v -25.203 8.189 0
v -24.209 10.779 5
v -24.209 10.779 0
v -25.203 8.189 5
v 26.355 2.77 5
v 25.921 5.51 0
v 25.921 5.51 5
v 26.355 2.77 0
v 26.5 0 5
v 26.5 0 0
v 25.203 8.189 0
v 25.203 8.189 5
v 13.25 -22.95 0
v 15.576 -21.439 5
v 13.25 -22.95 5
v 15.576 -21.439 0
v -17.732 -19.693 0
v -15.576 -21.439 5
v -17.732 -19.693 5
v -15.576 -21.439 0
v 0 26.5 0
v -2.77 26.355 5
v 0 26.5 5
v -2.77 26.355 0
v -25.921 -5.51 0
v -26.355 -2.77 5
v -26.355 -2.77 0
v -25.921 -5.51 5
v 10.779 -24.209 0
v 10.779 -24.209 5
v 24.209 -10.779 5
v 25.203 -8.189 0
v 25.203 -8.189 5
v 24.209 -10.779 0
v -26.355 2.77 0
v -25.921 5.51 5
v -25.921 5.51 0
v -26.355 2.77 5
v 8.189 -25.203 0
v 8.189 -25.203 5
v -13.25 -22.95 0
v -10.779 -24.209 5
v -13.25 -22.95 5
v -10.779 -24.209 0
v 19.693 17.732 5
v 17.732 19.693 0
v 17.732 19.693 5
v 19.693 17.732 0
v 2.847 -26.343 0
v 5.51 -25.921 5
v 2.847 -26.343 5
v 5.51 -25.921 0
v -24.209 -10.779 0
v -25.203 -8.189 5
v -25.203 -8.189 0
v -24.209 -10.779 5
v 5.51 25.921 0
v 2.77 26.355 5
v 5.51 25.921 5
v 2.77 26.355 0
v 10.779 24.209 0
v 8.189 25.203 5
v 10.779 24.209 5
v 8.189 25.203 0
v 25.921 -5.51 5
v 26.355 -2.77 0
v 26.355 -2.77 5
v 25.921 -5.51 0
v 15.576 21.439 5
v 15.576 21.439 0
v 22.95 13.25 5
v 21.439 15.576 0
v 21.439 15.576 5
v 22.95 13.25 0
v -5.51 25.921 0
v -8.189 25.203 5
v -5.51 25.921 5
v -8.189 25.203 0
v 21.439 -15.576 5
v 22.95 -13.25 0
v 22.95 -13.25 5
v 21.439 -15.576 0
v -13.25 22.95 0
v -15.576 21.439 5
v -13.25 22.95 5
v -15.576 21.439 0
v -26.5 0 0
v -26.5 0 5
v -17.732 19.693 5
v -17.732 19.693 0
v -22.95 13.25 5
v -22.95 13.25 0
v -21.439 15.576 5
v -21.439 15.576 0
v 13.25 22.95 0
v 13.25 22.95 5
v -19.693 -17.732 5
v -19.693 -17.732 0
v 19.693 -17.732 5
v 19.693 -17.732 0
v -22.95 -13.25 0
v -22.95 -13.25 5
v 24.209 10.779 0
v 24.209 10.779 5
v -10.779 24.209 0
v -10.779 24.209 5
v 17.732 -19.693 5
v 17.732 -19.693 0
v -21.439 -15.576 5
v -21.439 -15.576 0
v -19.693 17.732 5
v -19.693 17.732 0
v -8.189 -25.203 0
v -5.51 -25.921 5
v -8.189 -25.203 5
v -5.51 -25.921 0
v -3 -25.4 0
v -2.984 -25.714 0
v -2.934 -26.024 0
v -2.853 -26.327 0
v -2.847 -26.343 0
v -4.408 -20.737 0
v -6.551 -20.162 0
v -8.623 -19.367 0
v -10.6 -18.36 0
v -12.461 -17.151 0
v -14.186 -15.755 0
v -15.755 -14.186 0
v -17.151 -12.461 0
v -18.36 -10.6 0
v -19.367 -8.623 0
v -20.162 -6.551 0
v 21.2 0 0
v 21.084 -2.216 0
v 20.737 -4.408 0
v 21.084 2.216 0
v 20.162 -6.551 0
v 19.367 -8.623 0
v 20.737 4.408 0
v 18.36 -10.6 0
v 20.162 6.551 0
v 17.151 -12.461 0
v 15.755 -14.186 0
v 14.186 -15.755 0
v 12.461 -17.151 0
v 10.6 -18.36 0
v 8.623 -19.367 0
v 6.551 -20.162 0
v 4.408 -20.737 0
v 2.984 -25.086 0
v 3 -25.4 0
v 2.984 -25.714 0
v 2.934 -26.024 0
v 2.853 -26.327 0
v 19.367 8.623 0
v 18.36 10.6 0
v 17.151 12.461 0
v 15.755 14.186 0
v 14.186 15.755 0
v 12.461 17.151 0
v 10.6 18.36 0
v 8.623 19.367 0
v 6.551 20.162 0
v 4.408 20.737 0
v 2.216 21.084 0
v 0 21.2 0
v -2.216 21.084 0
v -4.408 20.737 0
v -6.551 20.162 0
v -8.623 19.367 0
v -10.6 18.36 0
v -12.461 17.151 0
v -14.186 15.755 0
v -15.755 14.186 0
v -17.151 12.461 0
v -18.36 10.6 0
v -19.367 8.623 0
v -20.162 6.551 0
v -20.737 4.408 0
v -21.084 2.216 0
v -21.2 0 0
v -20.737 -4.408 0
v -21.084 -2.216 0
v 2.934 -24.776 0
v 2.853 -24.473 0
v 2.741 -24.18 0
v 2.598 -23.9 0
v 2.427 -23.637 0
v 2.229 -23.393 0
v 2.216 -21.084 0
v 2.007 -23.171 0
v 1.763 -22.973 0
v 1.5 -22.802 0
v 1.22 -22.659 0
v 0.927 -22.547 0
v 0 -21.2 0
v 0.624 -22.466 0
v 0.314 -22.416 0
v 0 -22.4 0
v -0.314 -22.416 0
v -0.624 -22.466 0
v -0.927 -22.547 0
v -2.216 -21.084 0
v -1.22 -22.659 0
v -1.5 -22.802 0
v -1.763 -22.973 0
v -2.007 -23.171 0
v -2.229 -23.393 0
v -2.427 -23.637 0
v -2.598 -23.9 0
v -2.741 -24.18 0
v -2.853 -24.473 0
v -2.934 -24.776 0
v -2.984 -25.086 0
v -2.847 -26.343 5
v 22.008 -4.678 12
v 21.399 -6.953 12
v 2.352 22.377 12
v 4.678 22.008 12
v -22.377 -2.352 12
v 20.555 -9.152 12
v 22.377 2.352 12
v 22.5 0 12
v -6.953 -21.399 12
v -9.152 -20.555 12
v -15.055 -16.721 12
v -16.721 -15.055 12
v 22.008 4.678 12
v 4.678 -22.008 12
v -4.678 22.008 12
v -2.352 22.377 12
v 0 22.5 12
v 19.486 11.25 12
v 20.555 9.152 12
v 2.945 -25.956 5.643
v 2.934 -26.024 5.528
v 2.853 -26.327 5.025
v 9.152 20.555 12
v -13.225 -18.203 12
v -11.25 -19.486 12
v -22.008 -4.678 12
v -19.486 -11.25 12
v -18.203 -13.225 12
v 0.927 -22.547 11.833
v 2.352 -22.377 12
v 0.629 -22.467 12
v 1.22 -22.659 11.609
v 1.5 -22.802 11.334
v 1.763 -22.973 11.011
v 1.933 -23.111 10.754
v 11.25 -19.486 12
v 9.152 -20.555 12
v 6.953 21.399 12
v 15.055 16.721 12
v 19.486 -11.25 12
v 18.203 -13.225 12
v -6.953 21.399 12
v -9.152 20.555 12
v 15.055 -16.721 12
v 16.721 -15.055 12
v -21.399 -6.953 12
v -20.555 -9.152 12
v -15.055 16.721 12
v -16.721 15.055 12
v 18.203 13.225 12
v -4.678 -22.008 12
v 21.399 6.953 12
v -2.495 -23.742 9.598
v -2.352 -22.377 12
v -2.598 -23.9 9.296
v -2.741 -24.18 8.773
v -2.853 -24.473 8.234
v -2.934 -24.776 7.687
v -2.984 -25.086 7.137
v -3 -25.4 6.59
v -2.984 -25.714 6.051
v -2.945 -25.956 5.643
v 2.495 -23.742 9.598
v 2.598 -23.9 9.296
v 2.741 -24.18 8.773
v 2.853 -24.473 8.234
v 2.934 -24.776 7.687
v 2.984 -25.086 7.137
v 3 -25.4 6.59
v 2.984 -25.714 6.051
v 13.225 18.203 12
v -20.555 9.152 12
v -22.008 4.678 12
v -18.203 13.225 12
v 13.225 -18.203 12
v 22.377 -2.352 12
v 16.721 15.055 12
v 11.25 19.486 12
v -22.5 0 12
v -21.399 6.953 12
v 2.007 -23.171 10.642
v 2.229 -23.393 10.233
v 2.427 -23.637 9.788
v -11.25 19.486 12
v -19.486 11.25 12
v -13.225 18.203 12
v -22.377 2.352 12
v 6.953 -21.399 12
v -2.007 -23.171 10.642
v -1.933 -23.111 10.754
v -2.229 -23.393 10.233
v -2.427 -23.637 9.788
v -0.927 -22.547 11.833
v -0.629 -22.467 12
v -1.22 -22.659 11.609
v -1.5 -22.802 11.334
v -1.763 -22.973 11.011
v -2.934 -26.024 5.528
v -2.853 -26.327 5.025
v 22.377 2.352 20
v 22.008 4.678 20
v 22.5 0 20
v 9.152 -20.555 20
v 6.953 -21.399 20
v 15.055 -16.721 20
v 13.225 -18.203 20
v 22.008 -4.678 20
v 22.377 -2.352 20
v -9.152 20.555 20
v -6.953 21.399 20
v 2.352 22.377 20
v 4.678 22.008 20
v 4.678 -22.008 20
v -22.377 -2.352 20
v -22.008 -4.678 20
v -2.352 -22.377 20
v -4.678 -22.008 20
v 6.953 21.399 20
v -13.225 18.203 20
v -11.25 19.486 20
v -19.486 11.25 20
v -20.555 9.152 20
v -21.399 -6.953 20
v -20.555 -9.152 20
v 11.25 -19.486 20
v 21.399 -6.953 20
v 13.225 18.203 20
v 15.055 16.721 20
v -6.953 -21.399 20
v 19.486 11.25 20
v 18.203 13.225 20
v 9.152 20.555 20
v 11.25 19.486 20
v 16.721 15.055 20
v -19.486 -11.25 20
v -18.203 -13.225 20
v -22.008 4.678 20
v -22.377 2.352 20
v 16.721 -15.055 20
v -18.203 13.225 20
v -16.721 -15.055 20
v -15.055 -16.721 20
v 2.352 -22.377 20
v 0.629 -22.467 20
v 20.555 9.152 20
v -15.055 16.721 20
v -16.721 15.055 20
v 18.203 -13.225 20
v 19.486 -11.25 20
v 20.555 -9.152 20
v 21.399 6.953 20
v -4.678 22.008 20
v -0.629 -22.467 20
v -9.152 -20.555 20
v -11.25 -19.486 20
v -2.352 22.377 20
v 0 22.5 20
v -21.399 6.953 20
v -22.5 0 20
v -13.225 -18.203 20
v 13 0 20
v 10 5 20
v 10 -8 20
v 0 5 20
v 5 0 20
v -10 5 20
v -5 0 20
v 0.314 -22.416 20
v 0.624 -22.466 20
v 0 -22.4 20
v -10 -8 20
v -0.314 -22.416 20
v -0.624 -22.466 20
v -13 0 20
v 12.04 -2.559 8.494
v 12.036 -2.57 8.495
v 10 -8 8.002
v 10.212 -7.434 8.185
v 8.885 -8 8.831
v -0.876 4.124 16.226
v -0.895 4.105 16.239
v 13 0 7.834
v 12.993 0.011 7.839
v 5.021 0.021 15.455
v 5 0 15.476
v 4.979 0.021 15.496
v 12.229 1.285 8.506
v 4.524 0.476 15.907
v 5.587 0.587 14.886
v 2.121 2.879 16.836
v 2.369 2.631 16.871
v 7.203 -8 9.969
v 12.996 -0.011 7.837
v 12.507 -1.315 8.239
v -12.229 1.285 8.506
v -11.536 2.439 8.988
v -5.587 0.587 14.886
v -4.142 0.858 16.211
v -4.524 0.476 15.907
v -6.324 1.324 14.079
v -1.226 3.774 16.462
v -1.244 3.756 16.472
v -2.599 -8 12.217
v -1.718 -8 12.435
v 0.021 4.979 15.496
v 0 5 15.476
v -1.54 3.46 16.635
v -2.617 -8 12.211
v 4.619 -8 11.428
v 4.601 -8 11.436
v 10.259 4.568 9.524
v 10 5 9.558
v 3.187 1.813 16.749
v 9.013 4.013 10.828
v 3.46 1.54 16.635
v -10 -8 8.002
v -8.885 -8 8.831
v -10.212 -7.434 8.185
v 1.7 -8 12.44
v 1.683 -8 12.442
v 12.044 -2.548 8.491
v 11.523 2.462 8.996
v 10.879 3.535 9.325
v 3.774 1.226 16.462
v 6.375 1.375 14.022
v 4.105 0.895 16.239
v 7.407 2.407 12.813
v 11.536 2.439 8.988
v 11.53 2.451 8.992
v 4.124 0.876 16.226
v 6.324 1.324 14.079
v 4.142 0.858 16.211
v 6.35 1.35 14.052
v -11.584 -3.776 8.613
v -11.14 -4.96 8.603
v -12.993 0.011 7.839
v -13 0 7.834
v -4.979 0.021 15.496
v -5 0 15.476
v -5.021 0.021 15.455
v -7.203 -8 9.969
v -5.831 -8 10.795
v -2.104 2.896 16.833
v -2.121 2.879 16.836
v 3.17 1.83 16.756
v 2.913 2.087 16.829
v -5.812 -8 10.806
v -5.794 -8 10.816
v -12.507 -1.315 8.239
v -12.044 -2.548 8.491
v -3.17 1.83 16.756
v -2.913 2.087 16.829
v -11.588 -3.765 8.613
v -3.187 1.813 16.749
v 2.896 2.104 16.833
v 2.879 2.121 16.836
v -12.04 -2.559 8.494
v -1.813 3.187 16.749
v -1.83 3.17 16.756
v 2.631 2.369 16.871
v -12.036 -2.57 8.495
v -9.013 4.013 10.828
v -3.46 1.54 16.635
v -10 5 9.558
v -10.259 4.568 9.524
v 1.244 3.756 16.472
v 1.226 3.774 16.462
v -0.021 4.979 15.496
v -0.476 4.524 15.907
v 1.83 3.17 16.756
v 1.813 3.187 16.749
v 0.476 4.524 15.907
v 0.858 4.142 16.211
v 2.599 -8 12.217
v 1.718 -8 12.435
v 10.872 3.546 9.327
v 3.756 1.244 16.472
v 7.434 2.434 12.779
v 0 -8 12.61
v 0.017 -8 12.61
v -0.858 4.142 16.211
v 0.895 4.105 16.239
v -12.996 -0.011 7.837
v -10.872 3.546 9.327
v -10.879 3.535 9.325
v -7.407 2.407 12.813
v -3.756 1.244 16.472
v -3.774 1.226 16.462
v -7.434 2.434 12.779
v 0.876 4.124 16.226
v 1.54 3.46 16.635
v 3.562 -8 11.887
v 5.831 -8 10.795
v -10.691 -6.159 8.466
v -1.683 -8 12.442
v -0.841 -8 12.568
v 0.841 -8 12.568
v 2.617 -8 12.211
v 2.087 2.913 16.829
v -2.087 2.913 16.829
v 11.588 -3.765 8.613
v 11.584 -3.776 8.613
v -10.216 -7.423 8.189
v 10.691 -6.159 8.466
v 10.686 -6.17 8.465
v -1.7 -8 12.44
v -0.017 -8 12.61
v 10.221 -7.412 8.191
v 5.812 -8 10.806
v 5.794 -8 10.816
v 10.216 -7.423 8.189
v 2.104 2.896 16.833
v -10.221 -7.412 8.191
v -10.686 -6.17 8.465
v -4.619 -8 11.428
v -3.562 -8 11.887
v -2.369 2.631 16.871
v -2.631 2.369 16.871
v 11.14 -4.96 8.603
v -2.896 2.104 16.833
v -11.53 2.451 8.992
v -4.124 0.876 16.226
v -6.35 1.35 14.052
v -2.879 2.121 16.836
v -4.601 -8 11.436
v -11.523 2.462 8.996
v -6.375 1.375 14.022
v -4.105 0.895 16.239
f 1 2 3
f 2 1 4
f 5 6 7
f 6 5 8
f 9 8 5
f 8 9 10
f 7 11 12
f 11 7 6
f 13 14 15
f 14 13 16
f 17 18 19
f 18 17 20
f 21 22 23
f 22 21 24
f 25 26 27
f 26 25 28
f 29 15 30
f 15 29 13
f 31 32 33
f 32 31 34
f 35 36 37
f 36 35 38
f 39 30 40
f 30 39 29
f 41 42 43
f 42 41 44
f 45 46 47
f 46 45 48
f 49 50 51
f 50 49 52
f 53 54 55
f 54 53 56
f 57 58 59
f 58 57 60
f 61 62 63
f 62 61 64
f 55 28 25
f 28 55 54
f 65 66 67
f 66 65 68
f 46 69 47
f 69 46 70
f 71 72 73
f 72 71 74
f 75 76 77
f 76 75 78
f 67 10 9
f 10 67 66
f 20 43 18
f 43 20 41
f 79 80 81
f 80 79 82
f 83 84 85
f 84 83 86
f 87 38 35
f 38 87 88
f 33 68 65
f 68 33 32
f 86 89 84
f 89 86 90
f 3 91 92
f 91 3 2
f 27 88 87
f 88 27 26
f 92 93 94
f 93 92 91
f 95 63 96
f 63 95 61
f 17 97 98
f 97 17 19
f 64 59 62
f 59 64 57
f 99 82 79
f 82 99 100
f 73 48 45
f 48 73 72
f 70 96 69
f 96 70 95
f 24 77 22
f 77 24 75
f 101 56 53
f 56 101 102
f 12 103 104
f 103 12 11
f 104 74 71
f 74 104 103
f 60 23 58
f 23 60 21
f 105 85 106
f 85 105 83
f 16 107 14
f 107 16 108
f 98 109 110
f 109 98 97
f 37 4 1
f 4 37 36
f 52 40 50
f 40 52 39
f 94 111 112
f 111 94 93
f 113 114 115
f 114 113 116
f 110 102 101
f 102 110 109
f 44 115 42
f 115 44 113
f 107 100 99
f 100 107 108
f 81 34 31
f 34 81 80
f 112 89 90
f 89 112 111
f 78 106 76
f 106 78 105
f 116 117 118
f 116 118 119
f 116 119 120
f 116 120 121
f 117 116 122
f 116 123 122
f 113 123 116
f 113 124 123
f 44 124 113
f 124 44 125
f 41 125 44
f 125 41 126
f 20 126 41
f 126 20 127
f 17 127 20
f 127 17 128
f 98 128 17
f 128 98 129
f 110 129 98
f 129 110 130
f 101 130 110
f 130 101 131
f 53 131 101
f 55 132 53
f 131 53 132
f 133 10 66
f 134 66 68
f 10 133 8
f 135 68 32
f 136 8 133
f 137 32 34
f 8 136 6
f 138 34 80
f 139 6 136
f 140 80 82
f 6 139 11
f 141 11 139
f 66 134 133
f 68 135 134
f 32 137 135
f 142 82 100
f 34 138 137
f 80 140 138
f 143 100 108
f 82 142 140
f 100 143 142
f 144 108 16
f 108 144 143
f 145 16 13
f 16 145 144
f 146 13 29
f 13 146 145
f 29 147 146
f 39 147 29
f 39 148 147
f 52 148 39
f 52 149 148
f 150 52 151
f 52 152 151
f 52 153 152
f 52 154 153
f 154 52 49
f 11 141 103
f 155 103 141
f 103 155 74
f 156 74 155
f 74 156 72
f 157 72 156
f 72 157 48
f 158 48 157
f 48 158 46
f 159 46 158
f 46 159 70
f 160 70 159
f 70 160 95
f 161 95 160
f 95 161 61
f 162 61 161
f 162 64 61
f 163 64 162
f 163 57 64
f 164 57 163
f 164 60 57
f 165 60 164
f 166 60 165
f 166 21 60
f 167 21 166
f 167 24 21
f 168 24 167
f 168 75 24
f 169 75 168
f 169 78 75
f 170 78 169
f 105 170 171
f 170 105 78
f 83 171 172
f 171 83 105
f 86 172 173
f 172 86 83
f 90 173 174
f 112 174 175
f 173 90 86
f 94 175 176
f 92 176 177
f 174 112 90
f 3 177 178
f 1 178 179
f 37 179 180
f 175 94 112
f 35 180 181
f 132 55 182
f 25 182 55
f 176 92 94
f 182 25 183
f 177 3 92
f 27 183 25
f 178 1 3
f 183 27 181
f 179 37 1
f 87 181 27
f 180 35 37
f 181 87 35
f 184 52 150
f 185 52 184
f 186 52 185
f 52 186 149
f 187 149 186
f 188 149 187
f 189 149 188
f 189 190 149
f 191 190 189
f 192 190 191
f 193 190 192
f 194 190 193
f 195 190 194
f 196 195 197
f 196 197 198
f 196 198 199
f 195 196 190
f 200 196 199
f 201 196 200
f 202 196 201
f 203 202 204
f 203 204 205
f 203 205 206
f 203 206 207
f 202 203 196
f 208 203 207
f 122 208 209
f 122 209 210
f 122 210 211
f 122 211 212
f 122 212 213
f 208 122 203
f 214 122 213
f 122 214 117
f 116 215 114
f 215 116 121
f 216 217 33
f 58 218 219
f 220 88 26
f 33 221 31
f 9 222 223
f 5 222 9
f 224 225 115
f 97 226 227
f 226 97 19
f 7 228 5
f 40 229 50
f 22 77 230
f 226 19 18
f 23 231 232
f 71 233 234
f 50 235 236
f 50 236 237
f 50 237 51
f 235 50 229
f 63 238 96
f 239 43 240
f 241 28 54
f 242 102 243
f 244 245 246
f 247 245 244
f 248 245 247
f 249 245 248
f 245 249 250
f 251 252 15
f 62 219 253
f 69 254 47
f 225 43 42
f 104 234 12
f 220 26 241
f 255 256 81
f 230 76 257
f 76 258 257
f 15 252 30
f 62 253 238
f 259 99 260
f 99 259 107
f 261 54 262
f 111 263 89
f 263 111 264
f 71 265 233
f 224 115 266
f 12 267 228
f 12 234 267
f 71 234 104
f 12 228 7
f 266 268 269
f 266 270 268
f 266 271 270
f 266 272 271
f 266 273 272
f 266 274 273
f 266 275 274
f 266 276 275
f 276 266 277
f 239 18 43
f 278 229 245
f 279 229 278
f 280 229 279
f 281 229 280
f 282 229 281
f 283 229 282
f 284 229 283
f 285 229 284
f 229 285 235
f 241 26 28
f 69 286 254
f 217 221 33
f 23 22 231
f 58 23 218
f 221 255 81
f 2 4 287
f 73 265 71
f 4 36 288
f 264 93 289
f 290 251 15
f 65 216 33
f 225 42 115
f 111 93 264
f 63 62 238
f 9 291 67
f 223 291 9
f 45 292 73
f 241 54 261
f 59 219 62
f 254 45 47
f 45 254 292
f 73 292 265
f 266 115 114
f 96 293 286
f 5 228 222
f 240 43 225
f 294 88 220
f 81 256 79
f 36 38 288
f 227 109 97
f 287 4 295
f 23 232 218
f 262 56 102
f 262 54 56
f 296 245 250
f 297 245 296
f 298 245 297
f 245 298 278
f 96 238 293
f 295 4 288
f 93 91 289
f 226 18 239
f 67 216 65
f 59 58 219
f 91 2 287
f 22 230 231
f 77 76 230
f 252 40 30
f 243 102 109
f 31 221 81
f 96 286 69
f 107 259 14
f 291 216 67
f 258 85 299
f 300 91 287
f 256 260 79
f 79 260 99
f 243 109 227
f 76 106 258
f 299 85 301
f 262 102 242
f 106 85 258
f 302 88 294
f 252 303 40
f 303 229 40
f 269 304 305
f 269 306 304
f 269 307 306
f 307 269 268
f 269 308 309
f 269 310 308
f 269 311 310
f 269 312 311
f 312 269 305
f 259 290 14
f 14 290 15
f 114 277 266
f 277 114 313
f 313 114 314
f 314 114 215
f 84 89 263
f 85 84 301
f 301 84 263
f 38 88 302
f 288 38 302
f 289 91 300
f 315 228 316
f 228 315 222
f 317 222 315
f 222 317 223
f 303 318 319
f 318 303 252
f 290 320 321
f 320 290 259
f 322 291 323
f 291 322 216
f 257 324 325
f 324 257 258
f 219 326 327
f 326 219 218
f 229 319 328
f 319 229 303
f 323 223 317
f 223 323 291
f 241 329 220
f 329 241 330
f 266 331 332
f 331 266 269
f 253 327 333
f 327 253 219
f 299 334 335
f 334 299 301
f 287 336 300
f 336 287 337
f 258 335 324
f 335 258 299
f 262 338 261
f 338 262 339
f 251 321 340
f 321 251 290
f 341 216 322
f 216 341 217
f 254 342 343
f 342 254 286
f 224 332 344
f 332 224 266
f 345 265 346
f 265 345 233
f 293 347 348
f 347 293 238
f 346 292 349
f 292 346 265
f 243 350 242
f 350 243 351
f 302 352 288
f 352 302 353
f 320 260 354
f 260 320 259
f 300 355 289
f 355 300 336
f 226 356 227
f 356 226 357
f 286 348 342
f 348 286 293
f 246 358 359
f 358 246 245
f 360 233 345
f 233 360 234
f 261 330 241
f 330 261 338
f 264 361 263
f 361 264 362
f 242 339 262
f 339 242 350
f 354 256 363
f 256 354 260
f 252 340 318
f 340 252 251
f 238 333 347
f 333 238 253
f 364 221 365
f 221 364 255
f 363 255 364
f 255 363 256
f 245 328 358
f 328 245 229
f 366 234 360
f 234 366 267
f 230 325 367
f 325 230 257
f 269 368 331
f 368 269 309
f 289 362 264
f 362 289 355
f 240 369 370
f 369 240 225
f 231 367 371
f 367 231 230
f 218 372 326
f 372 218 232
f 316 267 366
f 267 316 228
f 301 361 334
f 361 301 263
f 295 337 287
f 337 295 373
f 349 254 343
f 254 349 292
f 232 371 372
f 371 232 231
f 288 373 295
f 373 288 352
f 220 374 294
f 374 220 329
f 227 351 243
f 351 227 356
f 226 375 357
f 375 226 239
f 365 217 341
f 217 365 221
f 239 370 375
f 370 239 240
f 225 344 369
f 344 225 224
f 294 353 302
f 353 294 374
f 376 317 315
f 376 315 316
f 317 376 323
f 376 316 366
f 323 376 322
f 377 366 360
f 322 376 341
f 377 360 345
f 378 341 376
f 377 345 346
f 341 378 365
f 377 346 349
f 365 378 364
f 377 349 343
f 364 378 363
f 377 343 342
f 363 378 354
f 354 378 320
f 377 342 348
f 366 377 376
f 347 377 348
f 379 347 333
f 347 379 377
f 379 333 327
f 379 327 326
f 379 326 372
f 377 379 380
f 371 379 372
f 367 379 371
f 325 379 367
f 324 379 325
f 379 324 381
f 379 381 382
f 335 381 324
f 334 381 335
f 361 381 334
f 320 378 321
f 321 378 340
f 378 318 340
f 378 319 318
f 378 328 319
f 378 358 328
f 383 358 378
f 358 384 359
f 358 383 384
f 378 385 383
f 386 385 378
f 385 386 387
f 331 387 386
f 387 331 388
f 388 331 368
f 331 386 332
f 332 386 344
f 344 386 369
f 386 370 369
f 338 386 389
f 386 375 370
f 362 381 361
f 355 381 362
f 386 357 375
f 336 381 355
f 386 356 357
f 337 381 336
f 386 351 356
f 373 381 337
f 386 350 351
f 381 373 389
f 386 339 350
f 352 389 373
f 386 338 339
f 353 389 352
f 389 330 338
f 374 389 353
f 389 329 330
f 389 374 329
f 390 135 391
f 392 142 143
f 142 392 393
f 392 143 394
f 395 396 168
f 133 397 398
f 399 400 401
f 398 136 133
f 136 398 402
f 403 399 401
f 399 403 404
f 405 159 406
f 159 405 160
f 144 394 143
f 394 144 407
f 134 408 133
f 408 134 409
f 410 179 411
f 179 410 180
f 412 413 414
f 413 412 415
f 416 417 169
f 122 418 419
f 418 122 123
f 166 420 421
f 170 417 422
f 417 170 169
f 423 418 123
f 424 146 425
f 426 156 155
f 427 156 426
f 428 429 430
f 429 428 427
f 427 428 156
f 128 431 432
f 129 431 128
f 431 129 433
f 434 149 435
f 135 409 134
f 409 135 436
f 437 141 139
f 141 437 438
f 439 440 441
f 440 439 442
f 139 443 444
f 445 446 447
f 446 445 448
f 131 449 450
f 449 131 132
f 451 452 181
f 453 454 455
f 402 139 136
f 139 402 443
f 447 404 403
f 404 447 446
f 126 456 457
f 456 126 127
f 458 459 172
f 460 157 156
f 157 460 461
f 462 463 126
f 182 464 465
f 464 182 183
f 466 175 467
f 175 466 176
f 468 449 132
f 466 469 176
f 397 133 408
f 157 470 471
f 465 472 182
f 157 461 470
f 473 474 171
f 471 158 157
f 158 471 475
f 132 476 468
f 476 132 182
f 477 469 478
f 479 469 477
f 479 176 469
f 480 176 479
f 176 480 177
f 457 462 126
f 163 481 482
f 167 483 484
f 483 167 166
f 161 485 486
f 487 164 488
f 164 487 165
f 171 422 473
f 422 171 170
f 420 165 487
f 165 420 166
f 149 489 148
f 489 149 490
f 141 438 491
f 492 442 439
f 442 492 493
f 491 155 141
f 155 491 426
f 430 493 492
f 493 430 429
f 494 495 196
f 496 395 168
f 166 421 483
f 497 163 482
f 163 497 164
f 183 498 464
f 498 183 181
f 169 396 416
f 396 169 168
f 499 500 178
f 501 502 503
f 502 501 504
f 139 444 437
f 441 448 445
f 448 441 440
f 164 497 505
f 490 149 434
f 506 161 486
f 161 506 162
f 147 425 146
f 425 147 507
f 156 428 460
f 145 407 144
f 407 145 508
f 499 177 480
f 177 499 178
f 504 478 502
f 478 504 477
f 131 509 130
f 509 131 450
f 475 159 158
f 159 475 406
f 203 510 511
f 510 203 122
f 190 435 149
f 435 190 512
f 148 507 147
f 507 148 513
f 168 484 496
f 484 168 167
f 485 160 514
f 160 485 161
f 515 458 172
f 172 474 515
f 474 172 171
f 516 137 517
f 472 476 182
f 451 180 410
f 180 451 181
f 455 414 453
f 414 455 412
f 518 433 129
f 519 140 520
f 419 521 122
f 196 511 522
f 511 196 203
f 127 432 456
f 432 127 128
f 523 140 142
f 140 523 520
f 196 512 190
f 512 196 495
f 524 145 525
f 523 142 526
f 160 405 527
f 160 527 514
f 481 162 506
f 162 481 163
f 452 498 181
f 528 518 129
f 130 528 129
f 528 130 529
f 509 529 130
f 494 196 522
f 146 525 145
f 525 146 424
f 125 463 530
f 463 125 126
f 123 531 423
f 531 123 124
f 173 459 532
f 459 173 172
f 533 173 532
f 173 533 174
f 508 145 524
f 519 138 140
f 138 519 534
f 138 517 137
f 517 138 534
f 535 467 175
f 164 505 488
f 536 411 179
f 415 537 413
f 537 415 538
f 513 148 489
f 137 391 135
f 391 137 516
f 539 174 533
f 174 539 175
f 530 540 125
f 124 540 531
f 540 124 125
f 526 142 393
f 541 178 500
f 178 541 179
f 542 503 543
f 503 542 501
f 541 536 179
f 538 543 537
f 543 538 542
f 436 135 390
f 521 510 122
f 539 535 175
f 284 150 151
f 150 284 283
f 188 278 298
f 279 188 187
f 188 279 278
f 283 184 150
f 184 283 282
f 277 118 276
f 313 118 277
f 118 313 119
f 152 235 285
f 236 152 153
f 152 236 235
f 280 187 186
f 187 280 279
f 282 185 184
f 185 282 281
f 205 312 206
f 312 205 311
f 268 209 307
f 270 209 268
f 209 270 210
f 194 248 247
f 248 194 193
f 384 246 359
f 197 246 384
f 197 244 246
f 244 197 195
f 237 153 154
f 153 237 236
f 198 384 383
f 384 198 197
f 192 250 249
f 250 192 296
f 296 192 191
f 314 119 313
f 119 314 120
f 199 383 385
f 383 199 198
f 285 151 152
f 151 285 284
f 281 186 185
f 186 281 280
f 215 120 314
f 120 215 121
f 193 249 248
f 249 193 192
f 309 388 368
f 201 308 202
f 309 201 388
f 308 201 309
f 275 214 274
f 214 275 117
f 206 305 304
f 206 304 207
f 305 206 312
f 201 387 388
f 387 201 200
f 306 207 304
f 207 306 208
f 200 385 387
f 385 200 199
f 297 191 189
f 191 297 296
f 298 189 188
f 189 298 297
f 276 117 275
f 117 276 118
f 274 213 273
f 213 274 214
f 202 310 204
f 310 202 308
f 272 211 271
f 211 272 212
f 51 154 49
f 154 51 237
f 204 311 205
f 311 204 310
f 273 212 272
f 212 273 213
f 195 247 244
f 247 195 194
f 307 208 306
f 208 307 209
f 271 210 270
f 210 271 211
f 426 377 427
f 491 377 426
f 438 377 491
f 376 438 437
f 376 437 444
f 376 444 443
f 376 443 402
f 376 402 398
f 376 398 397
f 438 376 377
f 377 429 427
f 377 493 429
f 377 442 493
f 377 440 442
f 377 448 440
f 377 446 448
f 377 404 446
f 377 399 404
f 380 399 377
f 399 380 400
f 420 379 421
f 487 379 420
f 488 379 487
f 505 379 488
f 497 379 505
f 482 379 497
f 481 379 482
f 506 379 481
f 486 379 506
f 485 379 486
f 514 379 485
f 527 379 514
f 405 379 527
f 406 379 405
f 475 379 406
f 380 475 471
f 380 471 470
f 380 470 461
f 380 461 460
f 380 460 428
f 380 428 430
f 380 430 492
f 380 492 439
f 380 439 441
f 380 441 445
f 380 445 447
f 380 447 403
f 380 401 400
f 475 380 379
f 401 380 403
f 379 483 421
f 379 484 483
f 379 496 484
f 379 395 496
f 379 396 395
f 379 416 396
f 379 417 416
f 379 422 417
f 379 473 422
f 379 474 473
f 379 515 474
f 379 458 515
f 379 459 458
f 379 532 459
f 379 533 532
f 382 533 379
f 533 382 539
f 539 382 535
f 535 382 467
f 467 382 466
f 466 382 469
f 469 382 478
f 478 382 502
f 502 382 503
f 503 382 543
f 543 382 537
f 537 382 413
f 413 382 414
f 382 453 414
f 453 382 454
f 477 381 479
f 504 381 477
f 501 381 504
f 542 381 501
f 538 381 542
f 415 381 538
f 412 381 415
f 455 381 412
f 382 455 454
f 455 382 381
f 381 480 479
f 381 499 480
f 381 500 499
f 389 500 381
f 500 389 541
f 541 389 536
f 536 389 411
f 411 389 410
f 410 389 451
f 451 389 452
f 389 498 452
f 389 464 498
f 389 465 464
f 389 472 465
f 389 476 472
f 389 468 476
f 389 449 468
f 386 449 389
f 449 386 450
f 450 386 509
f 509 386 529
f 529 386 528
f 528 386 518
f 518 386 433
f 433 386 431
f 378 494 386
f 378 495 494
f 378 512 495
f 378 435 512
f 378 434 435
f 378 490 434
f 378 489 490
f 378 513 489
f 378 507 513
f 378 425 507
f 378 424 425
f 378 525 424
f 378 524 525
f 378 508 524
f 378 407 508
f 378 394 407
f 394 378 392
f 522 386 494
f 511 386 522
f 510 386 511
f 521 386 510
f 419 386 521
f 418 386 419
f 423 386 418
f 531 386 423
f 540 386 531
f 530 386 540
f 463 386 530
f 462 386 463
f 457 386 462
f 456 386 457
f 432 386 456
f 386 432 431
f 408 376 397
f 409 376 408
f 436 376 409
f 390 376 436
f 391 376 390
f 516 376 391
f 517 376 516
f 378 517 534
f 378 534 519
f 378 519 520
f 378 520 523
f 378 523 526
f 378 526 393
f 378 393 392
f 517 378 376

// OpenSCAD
$fn=60;

prumer_1 = 53; // prumer lisovaciho nadstavce
prumer_2 = 45; // prumer lisovaciho nadstavce
vyska = 20; // vzska lisovaciho nadstavce


module plato()
{
    difference()
    {
        union()
        {
            translate([0,0,0]) cylinder(d=prumer_1, h=5);
            translate([0,0,5]) cylinder(d1=prumer_1,d2=prumer_2, h=7);
            translate([0,0,0]) cylinder(d=prumer_2, h=vyska);
        }
        union()
        {
            translate([0,0,0]) cylinder(d1=prumer_1*0.8, d=prumer_1*0.01, h=vyska);
            translate([0,-((prumer_1/2)-1.1),0]) cylinder(d=6, h=vyska);
        }
    }
}

module tvar_1()
{
    translate([-10,-5,0])
    {
        linear_extrude(vyska)
        {
            polygon(points=[[0,-3],[20,-3],[23,5],[20,10],[15,5],[10,10],[5,5],[0,10],[-3,5],]);
        }
    }
}

difference()
{
    plato();
    translate([0,0,0]) tvar_1();
}
